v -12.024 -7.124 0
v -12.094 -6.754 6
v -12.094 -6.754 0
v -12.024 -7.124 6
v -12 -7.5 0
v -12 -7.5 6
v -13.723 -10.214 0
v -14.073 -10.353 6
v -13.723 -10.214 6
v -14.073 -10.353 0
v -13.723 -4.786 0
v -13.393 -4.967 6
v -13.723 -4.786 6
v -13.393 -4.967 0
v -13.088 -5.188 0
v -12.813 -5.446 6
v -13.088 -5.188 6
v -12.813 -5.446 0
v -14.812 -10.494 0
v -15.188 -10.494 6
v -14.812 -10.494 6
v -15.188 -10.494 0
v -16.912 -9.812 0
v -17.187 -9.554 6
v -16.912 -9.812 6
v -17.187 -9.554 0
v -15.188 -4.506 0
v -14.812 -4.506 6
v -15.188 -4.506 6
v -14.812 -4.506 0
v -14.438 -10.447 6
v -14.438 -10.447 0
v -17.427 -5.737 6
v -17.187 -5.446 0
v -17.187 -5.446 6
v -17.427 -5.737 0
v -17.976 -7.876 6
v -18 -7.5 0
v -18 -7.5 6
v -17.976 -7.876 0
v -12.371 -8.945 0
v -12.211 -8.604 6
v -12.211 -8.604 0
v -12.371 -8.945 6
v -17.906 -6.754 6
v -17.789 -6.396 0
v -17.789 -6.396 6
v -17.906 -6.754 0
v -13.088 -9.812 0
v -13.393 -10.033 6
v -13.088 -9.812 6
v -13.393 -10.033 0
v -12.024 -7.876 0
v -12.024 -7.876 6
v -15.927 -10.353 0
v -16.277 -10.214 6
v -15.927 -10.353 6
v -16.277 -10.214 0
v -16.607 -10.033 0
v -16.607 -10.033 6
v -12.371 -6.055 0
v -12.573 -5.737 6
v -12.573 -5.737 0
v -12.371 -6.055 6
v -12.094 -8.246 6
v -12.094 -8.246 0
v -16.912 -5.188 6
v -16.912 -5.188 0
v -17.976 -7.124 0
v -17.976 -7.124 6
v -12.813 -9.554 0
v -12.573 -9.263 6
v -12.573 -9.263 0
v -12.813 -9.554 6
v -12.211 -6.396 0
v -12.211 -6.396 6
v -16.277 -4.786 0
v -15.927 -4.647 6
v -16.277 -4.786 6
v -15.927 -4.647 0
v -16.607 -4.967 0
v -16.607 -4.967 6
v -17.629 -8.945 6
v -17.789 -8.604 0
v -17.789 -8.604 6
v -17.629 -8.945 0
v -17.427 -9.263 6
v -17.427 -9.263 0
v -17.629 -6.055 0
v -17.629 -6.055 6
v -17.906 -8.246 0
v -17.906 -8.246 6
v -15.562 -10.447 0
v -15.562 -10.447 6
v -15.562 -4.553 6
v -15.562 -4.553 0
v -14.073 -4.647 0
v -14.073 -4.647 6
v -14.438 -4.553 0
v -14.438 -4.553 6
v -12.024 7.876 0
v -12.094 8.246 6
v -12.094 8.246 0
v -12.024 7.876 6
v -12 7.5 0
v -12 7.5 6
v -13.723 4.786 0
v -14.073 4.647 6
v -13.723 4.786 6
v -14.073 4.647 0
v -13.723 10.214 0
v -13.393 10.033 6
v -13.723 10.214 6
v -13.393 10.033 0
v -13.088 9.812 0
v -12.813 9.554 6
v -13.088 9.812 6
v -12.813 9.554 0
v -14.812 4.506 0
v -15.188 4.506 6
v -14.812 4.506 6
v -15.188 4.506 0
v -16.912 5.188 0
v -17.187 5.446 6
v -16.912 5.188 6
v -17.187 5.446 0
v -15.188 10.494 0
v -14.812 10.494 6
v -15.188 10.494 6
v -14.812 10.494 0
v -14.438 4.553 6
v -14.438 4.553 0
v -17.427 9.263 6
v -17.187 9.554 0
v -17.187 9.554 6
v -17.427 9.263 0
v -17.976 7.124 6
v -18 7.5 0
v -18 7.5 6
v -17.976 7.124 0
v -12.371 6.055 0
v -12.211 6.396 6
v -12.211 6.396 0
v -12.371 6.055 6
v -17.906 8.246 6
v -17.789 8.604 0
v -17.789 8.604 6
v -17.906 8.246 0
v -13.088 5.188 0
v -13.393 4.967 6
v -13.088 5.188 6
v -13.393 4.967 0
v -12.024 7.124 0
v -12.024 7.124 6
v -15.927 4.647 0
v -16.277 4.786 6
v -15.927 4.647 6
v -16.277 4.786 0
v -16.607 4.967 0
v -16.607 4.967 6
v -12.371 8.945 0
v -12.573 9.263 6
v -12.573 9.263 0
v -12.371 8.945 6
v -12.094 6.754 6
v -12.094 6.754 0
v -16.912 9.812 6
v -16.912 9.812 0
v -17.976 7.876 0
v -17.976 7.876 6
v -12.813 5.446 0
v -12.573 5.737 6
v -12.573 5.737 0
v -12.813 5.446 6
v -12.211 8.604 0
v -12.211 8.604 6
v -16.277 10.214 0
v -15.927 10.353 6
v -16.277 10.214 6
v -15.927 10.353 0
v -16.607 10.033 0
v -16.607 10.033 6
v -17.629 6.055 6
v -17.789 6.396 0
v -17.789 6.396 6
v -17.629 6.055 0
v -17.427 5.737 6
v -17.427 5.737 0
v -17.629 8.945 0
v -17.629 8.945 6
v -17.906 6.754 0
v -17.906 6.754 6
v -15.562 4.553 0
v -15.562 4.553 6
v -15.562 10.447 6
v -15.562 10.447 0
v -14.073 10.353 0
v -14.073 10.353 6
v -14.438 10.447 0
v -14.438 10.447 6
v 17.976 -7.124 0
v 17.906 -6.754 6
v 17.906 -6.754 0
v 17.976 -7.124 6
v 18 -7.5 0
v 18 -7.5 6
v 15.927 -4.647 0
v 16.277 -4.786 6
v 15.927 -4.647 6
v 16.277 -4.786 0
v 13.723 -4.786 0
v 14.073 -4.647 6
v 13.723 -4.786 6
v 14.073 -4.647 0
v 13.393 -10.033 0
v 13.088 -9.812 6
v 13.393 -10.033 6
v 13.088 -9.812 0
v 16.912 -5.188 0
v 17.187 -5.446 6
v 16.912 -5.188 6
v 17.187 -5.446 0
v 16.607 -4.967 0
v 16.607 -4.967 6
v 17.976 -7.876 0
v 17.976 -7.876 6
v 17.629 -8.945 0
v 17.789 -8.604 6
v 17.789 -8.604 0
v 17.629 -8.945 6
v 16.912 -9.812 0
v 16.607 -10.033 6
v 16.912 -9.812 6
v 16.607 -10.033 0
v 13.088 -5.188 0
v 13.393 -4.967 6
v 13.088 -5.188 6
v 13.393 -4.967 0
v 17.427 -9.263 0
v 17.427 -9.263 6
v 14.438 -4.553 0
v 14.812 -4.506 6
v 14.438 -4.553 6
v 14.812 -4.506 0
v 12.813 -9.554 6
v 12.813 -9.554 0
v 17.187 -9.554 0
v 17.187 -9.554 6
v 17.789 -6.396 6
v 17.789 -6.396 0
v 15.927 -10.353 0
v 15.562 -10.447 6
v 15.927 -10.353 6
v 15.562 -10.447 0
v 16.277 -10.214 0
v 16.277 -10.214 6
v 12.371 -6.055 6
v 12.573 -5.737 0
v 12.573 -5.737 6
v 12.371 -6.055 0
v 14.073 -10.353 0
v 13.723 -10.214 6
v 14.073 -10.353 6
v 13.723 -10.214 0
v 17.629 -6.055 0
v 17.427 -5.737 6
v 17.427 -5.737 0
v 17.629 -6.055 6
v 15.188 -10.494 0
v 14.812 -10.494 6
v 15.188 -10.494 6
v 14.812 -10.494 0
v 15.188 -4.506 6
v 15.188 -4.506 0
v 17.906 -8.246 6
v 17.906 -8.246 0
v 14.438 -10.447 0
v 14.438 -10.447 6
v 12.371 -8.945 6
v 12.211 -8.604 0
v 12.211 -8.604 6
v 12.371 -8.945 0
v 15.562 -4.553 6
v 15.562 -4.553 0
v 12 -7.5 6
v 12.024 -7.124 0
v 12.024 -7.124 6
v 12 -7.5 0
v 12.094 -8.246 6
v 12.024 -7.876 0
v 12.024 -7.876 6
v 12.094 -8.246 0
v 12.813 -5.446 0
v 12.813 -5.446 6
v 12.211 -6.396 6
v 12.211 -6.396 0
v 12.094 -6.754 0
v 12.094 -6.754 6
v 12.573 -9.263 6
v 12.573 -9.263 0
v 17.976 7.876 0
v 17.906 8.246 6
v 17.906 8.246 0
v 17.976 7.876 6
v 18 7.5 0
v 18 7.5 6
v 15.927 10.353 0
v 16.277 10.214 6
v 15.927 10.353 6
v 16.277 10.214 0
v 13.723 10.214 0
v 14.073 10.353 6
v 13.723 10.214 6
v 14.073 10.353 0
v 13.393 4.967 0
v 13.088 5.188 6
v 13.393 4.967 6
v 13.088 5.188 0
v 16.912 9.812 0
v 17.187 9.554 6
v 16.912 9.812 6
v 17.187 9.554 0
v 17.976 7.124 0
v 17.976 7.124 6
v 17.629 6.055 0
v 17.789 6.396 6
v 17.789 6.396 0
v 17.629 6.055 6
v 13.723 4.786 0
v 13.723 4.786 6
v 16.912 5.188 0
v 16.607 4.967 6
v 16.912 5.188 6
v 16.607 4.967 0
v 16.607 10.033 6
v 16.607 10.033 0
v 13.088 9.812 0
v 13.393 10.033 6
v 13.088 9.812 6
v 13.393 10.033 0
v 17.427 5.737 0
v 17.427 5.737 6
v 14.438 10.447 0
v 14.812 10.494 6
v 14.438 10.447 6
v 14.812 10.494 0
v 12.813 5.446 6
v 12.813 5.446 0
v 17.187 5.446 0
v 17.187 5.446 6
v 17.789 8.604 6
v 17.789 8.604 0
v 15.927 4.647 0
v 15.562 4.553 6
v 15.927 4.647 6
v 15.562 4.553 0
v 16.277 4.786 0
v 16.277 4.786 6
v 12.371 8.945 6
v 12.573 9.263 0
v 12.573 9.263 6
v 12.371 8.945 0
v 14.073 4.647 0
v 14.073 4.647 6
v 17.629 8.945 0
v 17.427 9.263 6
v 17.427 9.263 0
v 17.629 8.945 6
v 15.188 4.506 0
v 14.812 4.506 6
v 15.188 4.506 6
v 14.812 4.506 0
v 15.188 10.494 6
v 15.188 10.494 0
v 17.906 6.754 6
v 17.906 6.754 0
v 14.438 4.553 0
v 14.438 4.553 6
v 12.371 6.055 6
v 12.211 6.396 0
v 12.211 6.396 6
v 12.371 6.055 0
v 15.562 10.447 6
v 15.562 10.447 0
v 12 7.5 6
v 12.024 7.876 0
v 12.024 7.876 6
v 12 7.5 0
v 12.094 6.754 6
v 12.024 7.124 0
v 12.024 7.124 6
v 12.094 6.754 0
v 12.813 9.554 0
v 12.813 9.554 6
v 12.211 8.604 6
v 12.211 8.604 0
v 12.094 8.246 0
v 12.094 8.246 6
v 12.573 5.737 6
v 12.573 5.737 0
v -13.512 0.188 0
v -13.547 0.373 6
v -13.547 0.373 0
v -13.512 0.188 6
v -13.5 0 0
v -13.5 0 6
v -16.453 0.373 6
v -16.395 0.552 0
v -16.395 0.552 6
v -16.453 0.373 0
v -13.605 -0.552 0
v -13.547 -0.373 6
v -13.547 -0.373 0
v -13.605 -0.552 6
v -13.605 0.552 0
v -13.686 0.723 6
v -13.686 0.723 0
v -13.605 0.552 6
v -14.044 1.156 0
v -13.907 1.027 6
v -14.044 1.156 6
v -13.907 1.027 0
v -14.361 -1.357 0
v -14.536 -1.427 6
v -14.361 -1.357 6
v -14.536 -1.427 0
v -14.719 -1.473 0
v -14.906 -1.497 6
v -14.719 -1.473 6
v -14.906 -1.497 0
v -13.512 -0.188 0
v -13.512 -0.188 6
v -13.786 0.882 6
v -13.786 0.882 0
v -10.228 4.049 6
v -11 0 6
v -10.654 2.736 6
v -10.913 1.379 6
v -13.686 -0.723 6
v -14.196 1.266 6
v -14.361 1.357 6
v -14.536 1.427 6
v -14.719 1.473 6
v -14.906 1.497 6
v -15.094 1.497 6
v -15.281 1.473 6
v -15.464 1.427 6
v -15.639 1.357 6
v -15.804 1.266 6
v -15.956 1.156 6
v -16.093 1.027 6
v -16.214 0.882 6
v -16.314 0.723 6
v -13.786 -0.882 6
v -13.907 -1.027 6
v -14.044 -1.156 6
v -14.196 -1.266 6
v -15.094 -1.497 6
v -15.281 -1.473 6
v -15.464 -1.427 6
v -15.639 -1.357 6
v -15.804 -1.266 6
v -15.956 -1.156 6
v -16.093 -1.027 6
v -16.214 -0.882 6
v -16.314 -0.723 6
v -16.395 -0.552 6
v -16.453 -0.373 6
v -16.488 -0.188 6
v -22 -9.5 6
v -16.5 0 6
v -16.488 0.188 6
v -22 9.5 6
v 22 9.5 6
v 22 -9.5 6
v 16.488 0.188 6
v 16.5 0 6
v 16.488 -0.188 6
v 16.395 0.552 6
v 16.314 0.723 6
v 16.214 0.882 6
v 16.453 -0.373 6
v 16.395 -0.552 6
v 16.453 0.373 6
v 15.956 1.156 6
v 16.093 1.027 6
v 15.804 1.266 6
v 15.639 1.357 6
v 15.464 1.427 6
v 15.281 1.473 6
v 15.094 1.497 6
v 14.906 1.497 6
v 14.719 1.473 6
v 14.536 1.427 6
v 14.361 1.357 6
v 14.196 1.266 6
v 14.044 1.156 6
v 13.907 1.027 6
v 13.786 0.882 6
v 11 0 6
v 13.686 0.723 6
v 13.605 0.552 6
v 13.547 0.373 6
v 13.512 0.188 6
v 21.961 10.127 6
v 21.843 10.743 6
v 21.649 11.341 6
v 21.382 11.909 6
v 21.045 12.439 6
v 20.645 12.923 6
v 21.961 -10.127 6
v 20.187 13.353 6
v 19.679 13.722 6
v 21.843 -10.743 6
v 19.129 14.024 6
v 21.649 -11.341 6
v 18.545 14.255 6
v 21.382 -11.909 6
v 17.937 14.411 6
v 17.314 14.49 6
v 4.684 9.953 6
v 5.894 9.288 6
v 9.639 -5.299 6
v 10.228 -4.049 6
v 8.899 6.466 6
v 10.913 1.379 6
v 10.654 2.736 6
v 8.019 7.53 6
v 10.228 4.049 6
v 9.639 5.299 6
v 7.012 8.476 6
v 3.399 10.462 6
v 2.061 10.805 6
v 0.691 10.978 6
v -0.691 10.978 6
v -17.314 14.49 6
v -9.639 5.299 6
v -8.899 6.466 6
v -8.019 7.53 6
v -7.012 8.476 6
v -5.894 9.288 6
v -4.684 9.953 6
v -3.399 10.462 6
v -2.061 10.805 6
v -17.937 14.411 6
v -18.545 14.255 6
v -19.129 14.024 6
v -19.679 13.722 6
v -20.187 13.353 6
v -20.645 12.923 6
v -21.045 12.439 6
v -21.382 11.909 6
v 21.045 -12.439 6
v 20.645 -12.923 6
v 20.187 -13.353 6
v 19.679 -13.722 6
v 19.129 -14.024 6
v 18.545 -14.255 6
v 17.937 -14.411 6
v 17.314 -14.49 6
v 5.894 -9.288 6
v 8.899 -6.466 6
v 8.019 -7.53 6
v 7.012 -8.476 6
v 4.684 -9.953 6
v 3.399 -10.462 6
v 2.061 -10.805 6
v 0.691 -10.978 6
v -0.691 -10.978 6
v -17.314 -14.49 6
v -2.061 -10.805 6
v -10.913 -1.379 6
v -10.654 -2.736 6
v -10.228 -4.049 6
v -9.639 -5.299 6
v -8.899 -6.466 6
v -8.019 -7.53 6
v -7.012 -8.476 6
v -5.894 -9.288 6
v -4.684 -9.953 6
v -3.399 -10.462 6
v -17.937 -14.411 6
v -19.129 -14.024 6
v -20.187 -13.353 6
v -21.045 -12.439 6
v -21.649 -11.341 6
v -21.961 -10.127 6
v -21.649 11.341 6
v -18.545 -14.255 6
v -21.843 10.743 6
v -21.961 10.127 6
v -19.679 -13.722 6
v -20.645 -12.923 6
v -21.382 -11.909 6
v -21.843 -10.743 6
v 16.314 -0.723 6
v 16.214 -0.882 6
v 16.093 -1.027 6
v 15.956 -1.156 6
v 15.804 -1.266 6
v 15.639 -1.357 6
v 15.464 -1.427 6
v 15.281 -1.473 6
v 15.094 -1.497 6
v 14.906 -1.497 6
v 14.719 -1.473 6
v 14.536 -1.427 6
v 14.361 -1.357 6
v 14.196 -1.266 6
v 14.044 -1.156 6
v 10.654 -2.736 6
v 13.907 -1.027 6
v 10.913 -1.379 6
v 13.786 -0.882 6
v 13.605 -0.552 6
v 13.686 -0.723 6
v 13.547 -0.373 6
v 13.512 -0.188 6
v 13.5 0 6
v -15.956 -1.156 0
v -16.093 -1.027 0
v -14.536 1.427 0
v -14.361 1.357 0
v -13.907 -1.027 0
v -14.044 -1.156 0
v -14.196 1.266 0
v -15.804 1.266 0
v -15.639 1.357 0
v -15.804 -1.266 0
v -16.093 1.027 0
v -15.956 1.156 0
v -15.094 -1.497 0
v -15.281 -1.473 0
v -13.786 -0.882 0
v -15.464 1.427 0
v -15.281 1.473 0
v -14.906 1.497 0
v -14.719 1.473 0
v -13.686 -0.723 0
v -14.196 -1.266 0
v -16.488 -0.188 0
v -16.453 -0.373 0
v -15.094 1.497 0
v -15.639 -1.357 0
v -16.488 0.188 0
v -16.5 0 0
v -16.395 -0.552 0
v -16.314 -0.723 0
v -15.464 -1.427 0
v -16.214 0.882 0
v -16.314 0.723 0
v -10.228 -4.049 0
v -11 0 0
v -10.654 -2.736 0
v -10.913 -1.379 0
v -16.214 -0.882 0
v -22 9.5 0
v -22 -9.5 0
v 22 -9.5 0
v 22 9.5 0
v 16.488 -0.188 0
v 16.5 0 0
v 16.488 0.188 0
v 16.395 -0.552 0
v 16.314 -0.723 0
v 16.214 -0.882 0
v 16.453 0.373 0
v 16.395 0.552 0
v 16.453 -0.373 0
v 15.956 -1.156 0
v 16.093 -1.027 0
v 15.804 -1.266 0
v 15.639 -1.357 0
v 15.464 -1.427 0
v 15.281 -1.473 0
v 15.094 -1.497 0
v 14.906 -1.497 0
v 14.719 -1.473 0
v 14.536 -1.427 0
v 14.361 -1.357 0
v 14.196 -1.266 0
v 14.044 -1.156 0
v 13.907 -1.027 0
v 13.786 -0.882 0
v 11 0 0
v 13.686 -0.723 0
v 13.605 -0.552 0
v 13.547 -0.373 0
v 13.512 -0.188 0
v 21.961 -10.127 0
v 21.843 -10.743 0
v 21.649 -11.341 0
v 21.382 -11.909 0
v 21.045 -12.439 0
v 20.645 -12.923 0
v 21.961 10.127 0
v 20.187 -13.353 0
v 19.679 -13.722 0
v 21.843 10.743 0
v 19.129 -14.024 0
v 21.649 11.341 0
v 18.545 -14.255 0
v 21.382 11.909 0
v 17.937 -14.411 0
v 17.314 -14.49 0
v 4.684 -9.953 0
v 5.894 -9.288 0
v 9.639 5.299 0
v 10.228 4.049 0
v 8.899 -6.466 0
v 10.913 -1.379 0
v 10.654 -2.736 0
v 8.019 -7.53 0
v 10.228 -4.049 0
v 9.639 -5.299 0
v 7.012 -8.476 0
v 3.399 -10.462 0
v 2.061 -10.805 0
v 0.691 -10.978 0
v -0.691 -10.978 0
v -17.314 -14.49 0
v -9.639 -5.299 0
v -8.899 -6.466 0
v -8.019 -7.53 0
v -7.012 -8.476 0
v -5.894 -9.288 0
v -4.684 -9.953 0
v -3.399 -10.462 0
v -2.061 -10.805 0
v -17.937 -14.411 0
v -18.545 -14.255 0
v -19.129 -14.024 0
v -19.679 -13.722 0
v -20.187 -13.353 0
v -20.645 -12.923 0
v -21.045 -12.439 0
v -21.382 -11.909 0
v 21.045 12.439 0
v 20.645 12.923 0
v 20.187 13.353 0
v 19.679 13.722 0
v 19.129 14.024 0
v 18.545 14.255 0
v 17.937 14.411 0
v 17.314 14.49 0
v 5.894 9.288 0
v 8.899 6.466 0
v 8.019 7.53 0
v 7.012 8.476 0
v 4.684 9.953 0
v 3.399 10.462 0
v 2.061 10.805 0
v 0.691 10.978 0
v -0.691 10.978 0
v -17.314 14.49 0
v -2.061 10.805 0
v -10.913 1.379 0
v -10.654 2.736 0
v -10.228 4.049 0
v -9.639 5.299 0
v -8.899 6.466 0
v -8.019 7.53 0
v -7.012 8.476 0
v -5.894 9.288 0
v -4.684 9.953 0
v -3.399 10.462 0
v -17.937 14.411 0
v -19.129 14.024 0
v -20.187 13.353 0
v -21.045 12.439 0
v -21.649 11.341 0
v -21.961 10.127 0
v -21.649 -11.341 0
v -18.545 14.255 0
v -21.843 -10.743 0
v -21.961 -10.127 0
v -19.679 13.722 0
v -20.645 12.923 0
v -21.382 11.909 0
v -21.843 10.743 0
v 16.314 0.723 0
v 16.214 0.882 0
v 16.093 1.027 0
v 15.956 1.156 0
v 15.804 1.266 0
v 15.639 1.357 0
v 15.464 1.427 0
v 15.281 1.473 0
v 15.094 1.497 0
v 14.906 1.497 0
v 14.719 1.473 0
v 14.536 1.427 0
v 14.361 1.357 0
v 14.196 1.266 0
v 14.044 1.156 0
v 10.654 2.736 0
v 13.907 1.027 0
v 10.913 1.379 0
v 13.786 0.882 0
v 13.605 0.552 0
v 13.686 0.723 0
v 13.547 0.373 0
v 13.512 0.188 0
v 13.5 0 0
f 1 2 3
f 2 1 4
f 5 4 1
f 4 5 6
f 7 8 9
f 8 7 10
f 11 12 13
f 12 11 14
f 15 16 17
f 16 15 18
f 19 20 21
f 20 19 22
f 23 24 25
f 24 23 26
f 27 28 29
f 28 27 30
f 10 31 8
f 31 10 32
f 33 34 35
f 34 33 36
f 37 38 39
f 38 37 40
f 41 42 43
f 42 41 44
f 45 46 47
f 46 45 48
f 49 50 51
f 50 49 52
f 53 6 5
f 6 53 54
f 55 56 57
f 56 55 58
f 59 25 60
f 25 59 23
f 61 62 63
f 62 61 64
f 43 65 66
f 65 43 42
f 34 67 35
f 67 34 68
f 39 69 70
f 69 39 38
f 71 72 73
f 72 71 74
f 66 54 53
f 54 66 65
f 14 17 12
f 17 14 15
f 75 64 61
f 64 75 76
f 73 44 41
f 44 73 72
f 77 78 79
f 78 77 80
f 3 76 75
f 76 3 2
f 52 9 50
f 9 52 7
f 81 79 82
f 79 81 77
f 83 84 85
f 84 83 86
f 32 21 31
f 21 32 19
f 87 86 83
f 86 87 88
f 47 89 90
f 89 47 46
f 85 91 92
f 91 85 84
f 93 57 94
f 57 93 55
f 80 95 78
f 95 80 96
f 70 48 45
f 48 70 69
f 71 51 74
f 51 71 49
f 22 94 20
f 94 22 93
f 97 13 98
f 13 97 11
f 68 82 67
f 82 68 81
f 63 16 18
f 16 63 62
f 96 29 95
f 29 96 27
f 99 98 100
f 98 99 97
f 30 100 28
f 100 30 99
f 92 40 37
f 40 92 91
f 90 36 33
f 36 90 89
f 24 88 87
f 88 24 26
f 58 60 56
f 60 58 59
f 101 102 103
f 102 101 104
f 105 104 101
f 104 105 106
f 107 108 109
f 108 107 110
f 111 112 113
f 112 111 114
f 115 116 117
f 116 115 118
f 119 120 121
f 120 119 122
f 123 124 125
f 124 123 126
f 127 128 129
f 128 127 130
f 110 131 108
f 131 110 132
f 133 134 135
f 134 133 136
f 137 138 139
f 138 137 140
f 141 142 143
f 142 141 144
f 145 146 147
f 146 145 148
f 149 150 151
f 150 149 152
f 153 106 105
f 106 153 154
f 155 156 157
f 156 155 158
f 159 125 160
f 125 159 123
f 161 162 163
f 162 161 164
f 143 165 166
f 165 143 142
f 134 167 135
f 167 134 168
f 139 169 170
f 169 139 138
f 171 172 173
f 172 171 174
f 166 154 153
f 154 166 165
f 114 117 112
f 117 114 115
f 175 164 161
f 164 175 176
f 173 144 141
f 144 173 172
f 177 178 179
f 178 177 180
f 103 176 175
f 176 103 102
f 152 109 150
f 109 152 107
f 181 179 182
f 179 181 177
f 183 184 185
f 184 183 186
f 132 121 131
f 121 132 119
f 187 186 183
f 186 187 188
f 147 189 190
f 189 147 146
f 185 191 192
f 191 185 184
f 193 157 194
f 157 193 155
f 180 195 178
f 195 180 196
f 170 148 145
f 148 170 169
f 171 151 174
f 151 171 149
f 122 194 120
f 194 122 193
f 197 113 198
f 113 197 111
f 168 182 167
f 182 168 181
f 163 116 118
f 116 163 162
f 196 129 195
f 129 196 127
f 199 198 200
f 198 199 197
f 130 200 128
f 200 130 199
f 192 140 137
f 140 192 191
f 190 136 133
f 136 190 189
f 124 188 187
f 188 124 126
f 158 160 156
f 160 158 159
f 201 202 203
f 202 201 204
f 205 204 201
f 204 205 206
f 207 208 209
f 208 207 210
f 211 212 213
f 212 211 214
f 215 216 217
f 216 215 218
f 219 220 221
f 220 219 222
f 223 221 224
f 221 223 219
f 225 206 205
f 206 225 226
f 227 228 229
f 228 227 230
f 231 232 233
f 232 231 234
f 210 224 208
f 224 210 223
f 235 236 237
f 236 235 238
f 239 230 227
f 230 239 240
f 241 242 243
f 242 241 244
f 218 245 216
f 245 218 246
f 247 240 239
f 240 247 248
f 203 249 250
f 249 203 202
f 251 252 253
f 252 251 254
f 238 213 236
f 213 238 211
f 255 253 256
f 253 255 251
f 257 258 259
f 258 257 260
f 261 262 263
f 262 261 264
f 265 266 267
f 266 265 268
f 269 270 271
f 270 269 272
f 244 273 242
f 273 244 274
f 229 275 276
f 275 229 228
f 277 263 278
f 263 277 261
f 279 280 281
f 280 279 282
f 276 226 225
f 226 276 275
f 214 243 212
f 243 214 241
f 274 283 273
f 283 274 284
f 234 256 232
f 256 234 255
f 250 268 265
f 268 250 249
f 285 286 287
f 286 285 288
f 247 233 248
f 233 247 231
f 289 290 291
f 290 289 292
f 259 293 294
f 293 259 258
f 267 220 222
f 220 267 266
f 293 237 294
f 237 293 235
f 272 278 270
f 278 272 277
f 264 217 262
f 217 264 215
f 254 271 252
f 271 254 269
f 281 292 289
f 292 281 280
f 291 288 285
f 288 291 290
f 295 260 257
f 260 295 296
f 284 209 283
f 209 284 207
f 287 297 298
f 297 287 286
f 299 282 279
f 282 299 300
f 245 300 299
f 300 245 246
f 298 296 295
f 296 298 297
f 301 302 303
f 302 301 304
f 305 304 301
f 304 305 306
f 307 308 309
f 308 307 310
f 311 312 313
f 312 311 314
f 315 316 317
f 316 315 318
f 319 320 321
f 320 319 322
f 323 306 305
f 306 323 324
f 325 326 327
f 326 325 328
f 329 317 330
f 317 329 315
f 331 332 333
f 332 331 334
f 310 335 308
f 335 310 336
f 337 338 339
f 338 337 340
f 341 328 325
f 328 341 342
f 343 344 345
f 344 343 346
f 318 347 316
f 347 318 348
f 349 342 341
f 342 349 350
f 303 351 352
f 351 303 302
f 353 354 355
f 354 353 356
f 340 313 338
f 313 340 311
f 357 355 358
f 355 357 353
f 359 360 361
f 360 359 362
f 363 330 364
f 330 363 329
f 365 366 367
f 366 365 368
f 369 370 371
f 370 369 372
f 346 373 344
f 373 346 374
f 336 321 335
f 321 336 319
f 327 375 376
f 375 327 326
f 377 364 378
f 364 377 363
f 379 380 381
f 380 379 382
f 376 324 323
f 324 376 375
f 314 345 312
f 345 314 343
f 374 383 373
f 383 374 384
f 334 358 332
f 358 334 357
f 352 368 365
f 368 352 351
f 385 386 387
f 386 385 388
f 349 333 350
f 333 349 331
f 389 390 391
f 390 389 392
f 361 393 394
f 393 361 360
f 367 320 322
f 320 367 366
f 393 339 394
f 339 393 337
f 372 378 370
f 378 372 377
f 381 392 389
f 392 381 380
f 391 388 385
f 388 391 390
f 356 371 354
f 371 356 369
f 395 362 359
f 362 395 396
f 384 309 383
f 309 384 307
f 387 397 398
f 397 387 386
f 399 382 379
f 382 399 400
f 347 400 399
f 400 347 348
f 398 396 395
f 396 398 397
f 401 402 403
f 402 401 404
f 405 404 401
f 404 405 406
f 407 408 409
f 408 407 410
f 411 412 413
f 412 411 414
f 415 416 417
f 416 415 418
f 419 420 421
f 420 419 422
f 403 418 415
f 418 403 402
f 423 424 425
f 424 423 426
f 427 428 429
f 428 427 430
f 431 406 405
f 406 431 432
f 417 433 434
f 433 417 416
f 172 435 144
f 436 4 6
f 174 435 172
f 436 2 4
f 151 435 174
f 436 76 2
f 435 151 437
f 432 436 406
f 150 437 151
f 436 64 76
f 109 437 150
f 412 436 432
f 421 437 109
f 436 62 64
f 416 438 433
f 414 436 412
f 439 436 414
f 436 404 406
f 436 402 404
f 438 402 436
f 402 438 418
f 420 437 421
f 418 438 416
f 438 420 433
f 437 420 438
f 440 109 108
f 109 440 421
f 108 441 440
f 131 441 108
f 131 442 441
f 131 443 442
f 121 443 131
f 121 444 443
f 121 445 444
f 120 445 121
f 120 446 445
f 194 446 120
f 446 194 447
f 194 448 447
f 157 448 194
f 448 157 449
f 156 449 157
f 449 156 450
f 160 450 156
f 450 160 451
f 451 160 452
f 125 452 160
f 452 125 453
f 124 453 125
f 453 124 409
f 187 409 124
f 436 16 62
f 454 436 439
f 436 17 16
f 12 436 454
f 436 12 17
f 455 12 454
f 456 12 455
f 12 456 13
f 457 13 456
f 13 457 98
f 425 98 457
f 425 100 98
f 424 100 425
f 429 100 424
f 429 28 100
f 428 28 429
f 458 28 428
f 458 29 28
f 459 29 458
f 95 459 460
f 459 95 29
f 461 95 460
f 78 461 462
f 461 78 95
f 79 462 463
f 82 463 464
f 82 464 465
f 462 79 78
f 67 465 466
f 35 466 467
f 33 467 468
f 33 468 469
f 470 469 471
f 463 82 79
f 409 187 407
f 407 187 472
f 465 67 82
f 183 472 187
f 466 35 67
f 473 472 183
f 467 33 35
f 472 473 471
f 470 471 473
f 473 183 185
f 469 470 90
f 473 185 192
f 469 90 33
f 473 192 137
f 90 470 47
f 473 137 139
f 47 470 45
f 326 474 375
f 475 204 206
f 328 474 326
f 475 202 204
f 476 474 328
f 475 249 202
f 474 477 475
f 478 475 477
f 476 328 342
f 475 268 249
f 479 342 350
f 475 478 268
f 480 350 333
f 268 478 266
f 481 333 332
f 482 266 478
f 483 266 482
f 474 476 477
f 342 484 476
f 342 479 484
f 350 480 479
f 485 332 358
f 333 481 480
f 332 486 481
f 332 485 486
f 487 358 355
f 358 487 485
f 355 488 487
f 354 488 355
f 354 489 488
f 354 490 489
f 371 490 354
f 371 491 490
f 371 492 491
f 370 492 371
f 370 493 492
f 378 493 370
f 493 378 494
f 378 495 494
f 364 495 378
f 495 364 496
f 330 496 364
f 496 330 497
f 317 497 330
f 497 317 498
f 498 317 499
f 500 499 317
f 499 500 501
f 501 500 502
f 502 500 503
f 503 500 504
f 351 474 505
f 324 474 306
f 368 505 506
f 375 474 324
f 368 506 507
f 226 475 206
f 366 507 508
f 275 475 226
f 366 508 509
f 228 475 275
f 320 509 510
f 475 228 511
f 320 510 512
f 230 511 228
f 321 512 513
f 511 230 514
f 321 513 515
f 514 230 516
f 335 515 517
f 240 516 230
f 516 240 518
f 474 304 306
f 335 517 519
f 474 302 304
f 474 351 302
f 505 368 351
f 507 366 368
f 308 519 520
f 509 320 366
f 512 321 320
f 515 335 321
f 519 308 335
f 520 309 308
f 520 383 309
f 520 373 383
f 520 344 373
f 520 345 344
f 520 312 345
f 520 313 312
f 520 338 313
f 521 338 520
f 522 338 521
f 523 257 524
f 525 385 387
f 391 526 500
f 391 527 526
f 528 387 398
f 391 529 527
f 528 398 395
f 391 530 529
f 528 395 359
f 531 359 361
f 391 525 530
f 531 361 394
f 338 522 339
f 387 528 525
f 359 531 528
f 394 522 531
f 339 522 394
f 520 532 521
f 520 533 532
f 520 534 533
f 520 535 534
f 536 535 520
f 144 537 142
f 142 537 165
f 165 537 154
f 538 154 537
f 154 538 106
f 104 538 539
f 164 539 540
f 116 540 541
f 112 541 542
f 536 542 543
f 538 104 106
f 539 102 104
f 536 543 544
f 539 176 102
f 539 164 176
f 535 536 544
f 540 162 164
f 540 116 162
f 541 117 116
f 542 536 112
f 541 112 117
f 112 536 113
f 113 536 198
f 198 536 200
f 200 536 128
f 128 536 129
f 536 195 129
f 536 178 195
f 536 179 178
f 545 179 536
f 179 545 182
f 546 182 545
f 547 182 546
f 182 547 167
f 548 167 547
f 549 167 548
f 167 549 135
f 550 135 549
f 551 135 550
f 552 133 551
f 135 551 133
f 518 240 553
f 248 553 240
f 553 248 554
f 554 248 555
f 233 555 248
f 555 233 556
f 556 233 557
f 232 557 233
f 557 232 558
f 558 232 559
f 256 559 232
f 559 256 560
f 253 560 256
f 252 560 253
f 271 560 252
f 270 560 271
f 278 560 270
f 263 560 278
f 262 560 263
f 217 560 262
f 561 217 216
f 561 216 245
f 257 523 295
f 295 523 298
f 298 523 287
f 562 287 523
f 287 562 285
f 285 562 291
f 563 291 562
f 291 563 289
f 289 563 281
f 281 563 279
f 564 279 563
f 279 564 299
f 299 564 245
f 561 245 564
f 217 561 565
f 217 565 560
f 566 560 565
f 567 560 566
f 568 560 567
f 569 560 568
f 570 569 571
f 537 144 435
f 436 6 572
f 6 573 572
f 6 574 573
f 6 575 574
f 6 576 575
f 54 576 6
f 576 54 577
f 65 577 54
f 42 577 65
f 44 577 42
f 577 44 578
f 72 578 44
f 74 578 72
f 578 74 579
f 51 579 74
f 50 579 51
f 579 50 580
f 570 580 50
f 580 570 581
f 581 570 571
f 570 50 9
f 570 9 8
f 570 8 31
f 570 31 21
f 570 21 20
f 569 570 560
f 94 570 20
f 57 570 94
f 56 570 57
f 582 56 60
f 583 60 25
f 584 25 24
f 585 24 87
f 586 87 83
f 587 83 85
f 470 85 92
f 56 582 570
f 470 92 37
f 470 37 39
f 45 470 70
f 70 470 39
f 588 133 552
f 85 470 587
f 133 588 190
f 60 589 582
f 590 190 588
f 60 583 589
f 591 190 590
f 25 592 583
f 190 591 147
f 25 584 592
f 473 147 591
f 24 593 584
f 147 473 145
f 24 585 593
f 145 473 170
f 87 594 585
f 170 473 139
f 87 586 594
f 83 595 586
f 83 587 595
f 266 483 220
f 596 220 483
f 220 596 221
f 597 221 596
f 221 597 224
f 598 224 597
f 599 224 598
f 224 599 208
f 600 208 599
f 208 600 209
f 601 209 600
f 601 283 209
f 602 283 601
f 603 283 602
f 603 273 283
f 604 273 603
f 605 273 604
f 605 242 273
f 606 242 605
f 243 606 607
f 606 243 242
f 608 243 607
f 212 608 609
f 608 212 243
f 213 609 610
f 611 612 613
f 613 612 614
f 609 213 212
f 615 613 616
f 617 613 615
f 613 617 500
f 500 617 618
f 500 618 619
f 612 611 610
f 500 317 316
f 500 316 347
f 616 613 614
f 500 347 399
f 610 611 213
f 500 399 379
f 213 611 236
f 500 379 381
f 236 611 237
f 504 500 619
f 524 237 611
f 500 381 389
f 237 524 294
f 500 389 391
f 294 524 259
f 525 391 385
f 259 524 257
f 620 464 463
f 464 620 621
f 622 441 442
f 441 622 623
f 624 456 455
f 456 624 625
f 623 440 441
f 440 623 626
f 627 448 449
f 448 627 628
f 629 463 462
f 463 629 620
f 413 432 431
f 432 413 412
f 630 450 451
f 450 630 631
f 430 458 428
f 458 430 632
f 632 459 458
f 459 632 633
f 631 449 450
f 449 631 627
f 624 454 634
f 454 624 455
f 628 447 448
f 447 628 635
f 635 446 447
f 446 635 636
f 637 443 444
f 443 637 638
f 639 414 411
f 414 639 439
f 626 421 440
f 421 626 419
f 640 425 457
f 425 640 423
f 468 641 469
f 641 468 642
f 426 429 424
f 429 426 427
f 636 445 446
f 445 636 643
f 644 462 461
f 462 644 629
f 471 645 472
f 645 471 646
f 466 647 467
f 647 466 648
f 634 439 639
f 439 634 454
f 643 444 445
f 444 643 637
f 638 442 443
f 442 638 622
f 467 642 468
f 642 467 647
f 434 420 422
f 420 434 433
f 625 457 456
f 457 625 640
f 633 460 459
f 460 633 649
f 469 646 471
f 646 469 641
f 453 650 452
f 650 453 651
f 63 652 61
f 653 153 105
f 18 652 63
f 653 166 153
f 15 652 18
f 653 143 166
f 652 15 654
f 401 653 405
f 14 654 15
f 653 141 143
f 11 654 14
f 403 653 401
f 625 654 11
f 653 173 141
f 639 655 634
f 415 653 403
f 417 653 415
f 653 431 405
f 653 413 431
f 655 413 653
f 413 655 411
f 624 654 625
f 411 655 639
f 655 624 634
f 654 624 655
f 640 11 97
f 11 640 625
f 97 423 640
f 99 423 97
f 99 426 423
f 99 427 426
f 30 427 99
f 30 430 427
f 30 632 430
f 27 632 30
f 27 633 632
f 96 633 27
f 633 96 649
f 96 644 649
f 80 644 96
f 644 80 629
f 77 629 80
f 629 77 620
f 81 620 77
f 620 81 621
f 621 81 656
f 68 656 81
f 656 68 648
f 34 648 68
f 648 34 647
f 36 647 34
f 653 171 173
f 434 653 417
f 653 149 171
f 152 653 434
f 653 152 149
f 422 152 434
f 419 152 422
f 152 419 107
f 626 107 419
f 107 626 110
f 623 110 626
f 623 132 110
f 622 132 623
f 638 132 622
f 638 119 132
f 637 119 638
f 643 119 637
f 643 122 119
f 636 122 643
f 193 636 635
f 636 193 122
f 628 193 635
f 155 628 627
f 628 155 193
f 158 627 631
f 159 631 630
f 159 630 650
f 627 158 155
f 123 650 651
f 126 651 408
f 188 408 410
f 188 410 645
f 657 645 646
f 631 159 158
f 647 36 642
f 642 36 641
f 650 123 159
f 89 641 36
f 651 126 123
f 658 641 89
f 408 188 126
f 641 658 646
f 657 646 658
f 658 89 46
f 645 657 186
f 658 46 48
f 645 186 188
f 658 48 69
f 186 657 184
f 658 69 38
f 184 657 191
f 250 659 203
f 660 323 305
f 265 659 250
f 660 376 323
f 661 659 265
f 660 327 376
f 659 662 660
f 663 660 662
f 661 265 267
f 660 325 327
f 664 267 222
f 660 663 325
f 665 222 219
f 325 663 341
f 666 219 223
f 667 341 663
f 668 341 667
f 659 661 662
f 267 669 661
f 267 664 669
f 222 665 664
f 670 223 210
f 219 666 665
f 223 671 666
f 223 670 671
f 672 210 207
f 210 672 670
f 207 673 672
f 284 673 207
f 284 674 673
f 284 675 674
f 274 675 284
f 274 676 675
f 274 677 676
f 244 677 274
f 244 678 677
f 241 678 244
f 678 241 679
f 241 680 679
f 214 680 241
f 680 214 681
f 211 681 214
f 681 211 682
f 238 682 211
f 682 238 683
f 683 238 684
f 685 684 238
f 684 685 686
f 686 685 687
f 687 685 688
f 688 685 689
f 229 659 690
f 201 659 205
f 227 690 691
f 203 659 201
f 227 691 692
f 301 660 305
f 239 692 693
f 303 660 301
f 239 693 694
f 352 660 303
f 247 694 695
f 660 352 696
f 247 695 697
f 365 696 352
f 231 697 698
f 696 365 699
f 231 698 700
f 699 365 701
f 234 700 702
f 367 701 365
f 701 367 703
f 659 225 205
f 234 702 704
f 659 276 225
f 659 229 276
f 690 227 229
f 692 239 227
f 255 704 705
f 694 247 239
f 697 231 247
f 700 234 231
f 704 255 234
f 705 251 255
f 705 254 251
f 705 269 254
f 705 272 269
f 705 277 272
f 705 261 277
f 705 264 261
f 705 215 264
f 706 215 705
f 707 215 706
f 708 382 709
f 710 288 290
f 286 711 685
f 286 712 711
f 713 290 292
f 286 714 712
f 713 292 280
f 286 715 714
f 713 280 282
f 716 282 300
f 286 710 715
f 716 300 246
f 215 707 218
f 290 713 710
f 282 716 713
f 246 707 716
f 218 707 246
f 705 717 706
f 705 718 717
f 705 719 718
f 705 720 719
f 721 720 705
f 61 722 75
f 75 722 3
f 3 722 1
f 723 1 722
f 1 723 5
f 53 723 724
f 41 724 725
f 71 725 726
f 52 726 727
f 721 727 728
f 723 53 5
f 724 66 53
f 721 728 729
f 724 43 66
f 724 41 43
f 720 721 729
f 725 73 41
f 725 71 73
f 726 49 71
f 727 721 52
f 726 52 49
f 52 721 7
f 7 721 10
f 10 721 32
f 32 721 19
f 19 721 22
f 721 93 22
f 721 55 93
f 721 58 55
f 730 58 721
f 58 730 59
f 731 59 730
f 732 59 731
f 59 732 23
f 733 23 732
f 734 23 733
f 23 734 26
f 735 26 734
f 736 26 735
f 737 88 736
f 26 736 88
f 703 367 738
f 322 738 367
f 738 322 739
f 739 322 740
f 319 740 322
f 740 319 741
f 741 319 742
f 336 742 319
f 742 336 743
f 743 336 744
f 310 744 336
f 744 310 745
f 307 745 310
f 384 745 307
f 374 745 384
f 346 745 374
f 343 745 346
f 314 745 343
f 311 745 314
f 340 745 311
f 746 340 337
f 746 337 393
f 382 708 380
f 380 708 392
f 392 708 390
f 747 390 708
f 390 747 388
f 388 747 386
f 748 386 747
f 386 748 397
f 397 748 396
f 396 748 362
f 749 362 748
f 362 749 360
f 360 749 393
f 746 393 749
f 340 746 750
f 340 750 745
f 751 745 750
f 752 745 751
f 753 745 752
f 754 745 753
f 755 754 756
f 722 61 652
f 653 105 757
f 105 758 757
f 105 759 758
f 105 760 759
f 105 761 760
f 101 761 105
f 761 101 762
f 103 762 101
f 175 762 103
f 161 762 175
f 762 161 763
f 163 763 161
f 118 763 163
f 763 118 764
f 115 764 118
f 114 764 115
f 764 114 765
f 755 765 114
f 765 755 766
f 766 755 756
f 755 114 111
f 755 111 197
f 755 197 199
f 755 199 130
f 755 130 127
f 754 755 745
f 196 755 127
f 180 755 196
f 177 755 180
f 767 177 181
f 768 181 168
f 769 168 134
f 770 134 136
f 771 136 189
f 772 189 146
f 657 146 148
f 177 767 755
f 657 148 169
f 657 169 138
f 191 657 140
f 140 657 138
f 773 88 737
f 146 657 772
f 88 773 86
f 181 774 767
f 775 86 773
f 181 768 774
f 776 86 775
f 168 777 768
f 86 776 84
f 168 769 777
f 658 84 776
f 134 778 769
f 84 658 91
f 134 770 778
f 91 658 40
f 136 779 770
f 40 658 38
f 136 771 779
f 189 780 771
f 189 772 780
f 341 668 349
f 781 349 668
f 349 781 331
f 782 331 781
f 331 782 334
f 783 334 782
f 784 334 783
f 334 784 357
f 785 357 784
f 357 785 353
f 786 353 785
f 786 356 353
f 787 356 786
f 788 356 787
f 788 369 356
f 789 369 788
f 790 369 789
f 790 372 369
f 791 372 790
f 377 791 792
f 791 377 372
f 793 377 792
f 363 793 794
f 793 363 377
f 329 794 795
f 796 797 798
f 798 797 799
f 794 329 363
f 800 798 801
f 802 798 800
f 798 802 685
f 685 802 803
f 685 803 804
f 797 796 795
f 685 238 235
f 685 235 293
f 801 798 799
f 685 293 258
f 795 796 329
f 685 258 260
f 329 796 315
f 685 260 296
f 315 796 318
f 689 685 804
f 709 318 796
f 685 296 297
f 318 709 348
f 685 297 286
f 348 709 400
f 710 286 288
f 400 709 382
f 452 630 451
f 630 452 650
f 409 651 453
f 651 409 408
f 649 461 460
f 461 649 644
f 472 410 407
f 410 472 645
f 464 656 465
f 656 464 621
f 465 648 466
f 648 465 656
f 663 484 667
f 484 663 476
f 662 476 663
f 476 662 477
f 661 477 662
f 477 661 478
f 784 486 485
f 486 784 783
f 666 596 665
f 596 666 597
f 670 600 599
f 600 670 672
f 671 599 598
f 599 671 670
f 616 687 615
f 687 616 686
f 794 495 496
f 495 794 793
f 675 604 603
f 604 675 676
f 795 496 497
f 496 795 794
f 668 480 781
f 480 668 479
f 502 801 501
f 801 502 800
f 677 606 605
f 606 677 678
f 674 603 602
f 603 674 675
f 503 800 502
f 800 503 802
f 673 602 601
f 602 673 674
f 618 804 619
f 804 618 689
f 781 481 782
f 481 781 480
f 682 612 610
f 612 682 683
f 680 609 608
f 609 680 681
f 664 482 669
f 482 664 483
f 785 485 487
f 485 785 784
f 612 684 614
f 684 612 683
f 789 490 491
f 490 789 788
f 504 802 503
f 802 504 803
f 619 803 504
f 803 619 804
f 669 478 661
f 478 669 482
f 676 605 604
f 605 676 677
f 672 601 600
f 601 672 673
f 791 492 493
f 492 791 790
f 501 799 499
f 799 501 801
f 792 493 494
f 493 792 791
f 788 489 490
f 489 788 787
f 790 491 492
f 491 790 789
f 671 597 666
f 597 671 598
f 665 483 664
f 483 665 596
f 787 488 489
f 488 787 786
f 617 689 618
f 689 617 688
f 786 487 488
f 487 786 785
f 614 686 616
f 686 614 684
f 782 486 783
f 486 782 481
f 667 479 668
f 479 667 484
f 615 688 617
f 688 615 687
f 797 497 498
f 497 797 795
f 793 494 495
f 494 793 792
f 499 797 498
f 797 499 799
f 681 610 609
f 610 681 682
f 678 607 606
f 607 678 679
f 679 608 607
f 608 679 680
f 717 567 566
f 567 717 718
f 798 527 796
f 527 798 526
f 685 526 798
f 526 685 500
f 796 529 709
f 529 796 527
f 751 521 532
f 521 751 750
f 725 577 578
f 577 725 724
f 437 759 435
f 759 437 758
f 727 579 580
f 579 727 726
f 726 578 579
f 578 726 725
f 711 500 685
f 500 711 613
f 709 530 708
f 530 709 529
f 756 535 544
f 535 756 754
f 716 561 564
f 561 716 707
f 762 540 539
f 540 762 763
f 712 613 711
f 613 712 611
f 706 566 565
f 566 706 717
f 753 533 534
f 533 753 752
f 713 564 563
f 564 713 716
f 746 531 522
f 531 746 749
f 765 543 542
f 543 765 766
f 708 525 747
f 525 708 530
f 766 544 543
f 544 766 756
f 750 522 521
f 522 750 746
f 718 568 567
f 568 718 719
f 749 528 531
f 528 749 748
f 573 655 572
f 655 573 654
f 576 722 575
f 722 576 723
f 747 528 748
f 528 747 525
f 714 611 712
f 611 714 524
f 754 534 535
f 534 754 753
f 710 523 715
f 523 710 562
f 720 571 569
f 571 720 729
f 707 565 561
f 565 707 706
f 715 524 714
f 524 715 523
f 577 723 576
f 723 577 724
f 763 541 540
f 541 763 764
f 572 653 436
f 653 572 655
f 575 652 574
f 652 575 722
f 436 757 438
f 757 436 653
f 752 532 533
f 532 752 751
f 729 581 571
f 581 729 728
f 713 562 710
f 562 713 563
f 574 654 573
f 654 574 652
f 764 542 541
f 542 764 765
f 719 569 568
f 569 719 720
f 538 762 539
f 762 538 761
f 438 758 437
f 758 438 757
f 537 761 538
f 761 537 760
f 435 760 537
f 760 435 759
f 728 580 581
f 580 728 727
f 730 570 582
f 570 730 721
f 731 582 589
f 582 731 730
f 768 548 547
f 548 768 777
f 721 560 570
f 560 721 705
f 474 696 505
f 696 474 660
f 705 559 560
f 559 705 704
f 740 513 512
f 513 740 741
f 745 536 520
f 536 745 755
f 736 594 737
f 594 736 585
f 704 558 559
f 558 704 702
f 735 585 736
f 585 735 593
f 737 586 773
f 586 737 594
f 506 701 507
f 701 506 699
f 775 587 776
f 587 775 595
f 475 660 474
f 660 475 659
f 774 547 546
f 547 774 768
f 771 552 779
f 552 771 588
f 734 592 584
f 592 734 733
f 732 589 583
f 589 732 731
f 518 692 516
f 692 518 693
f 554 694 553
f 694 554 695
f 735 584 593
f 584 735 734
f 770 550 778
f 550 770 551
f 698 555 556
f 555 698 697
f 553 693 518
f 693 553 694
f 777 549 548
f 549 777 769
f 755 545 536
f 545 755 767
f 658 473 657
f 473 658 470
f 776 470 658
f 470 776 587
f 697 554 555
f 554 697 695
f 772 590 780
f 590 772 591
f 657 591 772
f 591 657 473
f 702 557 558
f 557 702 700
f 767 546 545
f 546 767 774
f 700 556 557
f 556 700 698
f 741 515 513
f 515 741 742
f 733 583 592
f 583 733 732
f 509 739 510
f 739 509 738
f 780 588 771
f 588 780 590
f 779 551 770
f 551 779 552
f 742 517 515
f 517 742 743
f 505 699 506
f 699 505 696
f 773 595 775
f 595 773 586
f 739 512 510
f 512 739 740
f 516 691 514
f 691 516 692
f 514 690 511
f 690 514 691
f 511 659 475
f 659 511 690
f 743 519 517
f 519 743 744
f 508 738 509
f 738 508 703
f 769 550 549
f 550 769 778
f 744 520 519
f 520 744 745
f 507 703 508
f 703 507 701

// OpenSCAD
$fn = 50;


difference() {
	union() {
		hull() {
			translate(v = [-17.0000000000, 9.5000000000, 0]) {
				cylinder(h = 6, r = 5);
			}
			translate(v = [17.0000000000, 9.5000000000, 0]) {
				cylinder(h = 6, r = 5);
			}
			translate(v = [-17.0000000000, -9.5000000000, 0]) {
				cylinder(h = 6, r = 5);
			}
			translate(v = [17.0000000000, -9.5000000000, 0]) {
				cylinder(h = 6, r = 5);
			}
		}
	}
	union() {
		#translate(v = [-15.0000000000, -7.5000000000, 0]) {
			cylinder(h = 6, r = 3.0000000000);
		}
		#translate(v = [-15.0000000000, 7.5000000000, 0]) {
			cylinder(h = 6, r = 3.0000000000);
		}
		#translate(v = [15.0000000000, -7.5000000000, 0]) {
			cylinder(h = 6, r = 3.0000000000);
		}
		#translate(v = [15.0000000000, 7.5000000000, 0]) {
			cylinder(h = 6, r = 3.0000000000);
		}
		#translate(v = [-15.0000000000, -7.5000000000, -100.0000000000]) {
			cylinder(h = 200, r = 3.0000000000);
		}
		#translate(v = [-15.0000000000, 7.5000000000, -100.0000000000]) {
			cylinder(h = 200, r = 3.0000000000);
		}
		#translate(v = [15.0000000000, -7.5000000000, -100.0000000000]) {
			cylinder(h = 200, r = 3.0000000000);
		}
		#translate(v = [15.0000000000, 7.5000000000, -100.0000000000]) {
			cylinder(h = 200, r = 3.0000000000);
		}
		#translate(v = [-15.0000000000, -7.5000000000, 0]) {
			cylinder(h = 6, r = 1.5000000000);
		}
		#translate(v = [-15.0000000000, 0.0000000000, 0]) {
			cylinder(h = 6, r = 1.5000000000);
		}
		#translate(v = [-15.0000000000, 7.5000000000, 0]) {
			cylinder(h = 6, r = 1.5000000000);
		}
		#translate(v = [15.0000000000, -7.5000000000, 0]) {
			cylinder(h = 6, r = 1.5000000000);
		}
		#translate(v = [15.0000000000, 0.0000000000, 0]) {
			cylinder(h = 6, r = 1.5000000000);
		}
		#translate(v = [15.0000000000, 7.5000000000, 0]) {
			cylinder(h = 6, r = 1.5000000000);
		}
		#translate(v = [-15.0000000000, -7.5000000000, 0]) {
			cylinder(h = 6, r = 1.5000000000);
		}
		#translate(v = [-15.0000000000, 0.0000000000, 0]) {
			cylinder(h = 6, r = 1.5000000000);
		}
		#translate(v = [-15.0000000000, 7.5000000000, 0]) {
			cylinder(h = 6, r = 1.5000000000);
		}
		#translate(v = [15.0000000000, -7.5000000000, 0]) {
			cylinder(h = 6, r = 1.5000000000);
		}
		#translate(v = [15.0000000000, 0.0000000000, 0]) {
			cylinder(h = 6, r = 1.5000000000);
		}
		#translate(v = [15.0000000000, 7.5000000000, 0]) {
			cylinder(h = 6, r = 1.5000000000);
		}
		#translate(v = [-15.0000000000, -7.5000000000, 0]) {
			cylinder(h = 6, r = 1.5000000000);
		}
		#translate(v = [-15.0000000000, 0.0000000000, 0]) {
			cylinder(h = 6, r = 1.5000000000);
		}
		#translate(v = [-15.0000000000, 7.5000000000, 0]) {
			cylinder(h = 6, r = 1.5000000000);
		}
		#translate(v = [15.0000000000, -7.5000000000, 0]) {
			cylinder(h = 6, r = 1.5000000000);
		}
		#translate(v = [15.0000000000, 0.0000000000, 0]) {
			cylinder(h = 6, r = 1.5000000000);
		}
		#translate(v = [15.0000000000, 7.5000000000, 0]) {
			cylinder(h = 6, r = 1.5000000000);
		}
		#cylinder(h = 6, r = 11.0000000000);
	}
}
